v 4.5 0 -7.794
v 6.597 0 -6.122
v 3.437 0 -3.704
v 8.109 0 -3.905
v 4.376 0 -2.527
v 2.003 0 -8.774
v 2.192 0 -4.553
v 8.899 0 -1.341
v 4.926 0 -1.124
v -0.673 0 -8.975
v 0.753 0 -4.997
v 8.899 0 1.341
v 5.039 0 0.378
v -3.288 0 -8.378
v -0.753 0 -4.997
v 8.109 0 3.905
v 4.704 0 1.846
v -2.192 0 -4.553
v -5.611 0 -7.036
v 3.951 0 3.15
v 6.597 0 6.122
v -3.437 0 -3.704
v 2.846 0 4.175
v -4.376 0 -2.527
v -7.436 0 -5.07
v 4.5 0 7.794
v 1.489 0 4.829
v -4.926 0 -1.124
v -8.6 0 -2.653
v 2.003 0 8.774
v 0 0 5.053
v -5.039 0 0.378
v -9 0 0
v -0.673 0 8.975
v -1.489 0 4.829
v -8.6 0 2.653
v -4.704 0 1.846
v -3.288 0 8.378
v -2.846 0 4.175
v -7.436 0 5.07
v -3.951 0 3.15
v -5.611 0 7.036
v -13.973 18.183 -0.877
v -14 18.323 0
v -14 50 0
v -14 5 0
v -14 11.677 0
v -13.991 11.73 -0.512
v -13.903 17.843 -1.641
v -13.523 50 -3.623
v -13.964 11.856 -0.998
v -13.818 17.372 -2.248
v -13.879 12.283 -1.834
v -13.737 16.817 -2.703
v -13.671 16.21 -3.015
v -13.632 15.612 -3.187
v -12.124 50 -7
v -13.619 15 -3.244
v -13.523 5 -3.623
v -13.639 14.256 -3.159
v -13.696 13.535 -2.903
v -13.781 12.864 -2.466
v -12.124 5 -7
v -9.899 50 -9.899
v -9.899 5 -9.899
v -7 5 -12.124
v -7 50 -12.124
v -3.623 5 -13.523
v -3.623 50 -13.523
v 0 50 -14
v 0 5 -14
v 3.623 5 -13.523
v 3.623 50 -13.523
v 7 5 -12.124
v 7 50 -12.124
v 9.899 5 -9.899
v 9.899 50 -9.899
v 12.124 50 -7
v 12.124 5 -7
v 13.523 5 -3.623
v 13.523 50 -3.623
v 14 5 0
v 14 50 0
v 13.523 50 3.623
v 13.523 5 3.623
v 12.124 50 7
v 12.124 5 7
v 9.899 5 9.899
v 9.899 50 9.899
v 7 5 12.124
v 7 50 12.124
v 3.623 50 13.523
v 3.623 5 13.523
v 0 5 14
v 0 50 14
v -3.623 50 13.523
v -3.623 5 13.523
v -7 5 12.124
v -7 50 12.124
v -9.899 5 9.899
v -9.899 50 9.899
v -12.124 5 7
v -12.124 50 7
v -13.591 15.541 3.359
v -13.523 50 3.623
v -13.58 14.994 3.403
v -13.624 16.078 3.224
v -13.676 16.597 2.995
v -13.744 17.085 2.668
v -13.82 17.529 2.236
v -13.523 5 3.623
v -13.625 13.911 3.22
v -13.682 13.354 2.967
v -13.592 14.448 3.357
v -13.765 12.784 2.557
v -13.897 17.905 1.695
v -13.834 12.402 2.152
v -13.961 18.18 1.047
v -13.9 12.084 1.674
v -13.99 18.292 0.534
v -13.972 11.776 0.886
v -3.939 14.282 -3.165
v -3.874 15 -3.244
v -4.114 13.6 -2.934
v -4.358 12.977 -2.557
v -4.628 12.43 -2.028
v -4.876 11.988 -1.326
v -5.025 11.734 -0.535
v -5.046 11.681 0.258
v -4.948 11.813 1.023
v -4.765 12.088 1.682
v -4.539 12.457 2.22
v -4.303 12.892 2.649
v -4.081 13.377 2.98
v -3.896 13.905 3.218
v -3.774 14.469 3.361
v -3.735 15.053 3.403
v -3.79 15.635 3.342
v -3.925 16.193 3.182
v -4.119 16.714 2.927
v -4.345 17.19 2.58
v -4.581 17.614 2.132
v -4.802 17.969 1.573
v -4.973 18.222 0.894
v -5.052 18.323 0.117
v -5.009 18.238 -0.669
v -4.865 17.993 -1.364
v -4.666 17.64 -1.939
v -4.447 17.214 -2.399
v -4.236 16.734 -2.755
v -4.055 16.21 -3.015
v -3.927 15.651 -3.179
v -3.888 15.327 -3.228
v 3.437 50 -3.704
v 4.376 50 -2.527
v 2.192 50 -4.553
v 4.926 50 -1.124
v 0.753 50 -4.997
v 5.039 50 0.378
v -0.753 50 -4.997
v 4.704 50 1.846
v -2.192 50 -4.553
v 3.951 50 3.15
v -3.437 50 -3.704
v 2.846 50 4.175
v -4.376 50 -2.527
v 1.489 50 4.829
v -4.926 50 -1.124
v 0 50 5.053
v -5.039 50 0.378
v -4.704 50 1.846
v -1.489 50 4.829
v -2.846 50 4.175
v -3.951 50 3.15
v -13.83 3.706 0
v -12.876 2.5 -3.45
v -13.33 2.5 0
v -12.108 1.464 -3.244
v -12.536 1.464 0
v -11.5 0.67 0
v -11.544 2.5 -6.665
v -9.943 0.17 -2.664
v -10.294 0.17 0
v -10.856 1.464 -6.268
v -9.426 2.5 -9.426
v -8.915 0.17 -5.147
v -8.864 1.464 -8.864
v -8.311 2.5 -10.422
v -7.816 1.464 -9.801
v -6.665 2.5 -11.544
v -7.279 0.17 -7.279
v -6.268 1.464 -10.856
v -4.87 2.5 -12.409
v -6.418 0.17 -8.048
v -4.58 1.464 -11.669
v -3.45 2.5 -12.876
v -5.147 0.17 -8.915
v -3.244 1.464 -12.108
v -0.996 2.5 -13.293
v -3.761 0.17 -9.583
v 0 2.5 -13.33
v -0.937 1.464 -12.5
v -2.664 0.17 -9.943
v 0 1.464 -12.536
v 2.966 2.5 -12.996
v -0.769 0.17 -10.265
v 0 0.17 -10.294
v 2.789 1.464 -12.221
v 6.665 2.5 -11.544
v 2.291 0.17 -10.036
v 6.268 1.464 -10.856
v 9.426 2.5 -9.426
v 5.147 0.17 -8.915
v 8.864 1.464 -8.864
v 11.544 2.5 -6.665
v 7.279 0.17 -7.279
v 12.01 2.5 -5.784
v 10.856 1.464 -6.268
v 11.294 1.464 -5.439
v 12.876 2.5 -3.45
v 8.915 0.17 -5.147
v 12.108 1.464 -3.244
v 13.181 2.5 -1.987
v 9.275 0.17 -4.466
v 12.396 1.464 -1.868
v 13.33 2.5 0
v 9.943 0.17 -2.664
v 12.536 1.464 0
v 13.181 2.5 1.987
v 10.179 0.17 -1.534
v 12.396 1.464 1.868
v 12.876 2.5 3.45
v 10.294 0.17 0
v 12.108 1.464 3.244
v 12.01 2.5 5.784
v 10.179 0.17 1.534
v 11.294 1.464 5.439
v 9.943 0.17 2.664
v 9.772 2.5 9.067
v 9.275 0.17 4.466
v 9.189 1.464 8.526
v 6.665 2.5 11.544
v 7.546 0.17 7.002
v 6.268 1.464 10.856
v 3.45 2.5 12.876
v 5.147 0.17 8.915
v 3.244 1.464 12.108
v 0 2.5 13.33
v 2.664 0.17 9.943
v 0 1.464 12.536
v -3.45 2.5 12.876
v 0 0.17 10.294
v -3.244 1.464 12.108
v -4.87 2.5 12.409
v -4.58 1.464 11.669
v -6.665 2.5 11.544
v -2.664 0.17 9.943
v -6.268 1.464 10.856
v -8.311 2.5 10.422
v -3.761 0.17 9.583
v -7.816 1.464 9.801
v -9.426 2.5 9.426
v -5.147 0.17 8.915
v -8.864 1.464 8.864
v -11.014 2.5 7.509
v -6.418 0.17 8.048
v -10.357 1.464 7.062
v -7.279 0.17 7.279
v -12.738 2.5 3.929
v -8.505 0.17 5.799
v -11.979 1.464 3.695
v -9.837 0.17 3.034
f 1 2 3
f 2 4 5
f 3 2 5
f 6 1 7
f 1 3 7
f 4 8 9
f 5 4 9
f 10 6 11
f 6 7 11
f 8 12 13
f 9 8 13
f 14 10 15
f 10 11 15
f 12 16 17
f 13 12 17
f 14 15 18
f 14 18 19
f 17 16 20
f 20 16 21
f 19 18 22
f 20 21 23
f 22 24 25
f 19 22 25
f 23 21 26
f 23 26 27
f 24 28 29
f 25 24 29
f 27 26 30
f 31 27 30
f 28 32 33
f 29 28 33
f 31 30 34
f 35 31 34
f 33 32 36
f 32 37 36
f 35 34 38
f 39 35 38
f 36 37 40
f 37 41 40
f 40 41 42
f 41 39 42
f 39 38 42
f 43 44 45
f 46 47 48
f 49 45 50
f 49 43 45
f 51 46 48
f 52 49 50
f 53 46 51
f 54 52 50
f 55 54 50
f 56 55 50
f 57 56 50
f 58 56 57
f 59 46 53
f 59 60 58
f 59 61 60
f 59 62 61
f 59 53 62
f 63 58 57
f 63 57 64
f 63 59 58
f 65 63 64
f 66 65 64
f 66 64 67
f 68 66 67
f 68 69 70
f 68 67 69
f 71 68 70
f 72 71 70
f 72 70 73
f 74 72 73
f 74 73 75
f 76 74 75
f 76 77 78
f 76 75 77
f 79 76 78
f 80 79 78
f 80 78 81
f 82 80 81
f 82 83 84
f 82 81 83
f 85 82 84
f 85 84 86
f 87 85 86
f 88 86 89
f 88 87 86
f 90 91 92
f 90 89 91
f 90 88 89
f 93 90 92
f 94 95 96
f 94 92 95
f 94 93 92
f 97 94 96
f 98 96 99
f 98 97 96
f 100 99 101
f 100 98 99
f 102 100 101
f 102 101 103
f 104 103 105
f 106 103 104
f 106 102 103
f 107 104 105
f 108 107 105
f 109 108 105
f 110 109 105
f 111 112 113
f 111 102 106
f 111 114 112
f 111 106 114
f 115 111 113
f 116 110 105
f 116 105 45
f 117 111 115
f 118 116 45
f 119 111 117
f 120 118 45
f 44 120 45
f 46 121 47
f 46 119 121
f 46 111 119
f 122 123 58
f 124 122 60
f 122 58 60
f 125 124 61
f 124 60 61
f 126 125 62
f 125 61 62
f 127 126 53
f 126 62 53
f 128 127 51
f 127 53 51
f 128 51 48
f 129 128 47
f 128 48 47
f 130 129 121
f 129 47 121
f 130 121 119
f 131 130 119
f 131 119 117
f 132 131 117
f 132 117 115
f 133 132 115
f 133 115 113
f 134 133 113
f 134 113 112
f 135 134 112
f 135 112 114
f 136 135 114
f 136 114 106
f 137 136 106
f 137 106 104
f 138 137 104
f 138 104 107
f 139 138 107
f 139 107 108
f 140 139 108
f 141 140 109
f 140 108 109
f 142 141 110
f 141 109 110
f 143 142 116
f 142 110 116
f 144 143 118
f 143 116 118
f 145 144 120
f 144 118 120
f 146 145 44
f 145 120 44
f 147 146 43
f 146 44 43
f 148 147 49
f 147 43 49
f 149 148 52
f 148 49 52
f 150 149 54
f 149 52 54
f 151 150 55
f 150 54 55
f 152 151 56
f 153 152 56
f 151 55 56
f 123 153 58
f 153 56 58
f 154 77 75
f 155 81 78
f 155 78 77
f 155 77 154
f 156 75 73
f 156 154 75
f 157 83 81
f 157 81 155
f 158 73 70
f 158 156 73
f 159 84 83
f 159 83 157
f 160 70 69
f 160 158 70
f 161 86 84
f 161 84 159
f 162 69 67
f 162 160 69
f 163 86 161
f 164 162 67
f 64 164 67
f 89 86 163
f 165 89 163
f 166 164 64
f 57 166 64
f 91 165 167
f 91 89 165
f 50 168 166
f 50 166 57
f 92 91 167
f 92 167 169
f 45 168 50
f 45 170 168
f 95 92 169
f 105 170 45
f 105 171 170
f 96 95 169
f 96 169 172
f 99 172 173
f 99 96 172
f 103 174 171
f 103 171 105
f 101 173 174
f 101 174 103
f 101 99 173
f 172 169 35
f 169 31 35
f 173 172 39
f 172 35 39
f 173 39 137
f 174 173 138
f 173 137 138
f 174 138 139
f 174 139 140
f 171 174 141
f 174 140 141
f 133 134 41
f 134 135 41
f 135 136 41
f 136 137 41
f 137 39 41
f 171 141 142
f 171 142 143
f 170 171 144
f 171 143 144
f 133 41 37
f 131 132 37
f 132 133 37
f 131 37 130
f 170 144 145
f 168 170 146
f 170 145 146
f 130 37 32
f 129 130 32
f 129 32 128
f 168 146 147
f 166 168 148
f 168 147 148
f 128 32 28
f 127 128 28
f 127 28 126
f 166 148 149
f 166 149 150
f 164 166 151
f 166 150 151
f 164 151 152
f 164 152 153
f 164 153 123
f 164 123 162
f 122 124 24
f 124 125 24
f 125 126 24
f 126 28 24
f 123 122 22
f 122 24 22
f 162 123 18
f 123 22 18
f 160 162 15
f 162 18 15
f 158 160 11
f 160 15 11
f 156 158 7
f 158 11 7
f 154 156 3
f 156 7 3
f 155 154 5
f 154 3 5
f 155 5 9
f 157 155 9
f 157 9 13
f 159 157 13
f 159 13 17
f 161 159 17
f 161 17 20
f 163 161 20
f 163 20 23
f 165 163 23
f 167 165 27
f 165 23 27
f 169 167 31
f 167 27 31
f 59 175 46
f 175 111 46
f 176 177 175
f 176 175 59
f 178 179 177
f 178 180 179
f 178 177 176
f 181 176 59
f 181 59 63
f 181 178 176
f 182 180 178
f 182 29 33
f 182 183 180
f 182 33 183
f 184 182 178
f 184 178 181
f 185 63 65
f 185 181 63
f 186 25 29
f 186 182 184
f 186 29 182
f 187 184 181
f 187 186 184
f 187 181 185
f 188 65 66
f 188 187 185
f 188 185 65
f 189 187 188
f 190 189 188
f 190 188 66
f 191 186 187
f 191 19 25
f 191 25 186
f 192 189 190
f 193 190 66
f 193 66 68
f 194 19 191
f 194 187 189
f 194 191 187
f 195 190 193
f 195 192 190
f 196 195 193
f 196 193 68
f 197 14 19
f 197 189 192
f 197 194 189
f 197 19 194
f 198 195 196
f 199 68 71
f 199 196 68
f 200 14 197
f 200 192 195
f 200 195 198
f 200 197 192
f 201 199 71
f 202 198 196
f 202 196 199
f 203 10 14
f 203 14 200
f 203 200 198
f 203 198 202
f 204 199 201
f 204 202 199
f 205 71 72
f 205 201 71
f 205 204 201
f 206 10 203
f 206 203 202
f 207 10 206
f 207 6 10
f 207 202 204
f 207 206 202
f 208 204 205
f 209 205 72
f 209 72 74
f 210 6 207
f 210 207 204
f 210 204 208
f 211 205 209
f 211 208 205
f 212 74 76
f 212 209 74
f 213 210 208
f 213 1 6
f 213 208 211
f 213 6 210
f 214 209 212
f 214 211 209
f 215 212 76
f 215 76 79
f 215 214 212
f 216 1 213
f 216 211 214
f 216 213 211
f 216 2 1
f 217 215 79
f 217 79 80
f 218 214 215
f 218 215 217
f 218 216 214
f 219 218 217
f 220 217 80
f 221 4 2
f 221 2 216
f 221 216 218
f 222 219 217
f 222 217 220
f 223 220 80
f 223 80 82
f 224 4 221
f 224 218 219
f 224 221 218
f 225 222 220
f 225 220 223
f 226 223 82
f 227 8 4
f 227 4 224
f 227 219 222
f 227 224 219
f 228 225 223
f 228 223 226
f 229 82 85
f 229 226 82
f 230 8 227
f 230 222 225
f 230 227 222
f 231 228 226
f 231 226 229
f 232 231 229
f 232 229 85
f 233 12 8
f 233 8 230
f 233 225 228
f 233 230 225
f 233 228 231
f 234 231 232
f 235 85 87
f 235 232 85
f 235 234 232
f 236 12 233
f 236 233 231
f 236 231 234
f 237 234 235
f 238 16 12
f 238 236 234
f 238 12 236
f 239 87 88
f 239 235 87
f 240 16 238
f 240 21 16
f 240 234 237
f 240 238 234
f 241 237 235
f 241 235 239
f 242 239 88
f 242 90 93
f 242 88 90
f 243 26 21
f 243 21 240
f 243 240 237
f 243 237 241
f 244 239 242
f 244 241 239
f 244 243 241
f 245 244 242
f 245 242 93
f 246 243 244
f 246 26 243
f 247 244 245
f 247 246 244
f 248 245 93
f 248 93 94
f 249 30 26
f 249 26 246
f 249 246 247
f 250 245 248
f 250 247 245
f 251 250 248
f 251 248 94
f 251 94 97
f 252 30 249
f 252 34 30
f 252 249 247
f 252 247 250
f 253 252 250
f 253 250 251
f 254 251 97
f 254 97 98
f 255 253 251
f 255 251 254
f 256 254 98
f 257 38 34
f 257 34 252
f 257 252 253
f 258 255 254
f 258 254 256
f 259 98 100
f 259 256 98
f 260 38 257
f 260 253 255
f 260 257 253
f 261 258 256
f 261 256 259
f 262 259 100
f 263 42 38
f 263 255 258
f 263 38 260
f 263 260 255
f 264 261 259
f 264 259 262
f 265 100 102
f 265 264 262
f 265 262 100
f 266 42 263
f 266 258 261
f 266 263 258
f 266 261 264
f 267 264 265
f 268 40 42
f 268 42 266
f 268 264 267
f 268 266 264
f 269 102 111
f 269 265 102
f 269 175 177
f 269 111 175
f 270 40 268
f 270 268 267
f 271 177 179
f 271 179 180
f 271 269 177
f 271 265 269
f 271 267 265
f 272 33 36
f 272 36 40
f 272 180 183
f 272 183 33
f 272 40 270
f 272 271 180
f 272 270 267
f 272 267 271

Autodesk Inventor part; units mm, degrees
ref_plane "YZ Plane" through (0, 0, 0) normal (1, 0, 0) x (0, 1, 0)
ref_plane "XZ Plane" through (0, 0, 0) normal (0, 1, 0) x (-1, 0, 0)
ref_plane "XY Plane" through (0, 0, 0) normal (0, 0, 1) x (1, 0, 0)
sketch "Sketch1" plane through (0, 0, 0) normal (0, 1, 0) x (-1, 0, 0)
  circle A0 centre (0, 0) radius 14
  dimension "d0" = 28
extrude "Extrusion1" add sketch "Sketch1" along normal blind 50
sketch "Sketch2" plane through (0, 50, 0) normal (0, 1, 0) x (1, 0, 0)
  circle A0 centre (0, 0) radius 2.5
  dimension "d3" = 5
hole "Hole1" at (0, 50, 0) direction (0, -1, 0) diameter 10.106 depth 50 tip angle 118 thread size "M12x1.75" class "6H" standard "ANSI Metric M Profile"
sketch "Sketch3" plane through (0, 0, 0) normal (1, 0, 0) x (0, 1, 0)
  line L0 (50, -14) -> (50, 14) projected
  line L1 (50, 14.1595) -> (0, -14)
  line L2 (0, 14) -> (0, -14) projected
  line L3 (50, 14.1595) -> (50, -14)
  line L4 (0, 14.1595) -> (15, 14.1595)
  line L5 (15, 14.1595) -> (15, 0.0798)
  circle A0 centre (15, 0.0798) radius 2
  point P0 (0, 0)
  dimension "d11" = 15
  dimension "d12" = 4
hole "Hole2" at (0, 15, 0.0798) direction (-1, 0, 0) diameter 6.647 depth 22.2 tip angle 118 thread size "M8x1.25" class "6H" standard "ANSI Metric M Profile"
fillet "Fillet1" radius 5 1 edges at (14, 0, 0)
properties part number "FIXADOR_APOIO_ROLAMENTO"
